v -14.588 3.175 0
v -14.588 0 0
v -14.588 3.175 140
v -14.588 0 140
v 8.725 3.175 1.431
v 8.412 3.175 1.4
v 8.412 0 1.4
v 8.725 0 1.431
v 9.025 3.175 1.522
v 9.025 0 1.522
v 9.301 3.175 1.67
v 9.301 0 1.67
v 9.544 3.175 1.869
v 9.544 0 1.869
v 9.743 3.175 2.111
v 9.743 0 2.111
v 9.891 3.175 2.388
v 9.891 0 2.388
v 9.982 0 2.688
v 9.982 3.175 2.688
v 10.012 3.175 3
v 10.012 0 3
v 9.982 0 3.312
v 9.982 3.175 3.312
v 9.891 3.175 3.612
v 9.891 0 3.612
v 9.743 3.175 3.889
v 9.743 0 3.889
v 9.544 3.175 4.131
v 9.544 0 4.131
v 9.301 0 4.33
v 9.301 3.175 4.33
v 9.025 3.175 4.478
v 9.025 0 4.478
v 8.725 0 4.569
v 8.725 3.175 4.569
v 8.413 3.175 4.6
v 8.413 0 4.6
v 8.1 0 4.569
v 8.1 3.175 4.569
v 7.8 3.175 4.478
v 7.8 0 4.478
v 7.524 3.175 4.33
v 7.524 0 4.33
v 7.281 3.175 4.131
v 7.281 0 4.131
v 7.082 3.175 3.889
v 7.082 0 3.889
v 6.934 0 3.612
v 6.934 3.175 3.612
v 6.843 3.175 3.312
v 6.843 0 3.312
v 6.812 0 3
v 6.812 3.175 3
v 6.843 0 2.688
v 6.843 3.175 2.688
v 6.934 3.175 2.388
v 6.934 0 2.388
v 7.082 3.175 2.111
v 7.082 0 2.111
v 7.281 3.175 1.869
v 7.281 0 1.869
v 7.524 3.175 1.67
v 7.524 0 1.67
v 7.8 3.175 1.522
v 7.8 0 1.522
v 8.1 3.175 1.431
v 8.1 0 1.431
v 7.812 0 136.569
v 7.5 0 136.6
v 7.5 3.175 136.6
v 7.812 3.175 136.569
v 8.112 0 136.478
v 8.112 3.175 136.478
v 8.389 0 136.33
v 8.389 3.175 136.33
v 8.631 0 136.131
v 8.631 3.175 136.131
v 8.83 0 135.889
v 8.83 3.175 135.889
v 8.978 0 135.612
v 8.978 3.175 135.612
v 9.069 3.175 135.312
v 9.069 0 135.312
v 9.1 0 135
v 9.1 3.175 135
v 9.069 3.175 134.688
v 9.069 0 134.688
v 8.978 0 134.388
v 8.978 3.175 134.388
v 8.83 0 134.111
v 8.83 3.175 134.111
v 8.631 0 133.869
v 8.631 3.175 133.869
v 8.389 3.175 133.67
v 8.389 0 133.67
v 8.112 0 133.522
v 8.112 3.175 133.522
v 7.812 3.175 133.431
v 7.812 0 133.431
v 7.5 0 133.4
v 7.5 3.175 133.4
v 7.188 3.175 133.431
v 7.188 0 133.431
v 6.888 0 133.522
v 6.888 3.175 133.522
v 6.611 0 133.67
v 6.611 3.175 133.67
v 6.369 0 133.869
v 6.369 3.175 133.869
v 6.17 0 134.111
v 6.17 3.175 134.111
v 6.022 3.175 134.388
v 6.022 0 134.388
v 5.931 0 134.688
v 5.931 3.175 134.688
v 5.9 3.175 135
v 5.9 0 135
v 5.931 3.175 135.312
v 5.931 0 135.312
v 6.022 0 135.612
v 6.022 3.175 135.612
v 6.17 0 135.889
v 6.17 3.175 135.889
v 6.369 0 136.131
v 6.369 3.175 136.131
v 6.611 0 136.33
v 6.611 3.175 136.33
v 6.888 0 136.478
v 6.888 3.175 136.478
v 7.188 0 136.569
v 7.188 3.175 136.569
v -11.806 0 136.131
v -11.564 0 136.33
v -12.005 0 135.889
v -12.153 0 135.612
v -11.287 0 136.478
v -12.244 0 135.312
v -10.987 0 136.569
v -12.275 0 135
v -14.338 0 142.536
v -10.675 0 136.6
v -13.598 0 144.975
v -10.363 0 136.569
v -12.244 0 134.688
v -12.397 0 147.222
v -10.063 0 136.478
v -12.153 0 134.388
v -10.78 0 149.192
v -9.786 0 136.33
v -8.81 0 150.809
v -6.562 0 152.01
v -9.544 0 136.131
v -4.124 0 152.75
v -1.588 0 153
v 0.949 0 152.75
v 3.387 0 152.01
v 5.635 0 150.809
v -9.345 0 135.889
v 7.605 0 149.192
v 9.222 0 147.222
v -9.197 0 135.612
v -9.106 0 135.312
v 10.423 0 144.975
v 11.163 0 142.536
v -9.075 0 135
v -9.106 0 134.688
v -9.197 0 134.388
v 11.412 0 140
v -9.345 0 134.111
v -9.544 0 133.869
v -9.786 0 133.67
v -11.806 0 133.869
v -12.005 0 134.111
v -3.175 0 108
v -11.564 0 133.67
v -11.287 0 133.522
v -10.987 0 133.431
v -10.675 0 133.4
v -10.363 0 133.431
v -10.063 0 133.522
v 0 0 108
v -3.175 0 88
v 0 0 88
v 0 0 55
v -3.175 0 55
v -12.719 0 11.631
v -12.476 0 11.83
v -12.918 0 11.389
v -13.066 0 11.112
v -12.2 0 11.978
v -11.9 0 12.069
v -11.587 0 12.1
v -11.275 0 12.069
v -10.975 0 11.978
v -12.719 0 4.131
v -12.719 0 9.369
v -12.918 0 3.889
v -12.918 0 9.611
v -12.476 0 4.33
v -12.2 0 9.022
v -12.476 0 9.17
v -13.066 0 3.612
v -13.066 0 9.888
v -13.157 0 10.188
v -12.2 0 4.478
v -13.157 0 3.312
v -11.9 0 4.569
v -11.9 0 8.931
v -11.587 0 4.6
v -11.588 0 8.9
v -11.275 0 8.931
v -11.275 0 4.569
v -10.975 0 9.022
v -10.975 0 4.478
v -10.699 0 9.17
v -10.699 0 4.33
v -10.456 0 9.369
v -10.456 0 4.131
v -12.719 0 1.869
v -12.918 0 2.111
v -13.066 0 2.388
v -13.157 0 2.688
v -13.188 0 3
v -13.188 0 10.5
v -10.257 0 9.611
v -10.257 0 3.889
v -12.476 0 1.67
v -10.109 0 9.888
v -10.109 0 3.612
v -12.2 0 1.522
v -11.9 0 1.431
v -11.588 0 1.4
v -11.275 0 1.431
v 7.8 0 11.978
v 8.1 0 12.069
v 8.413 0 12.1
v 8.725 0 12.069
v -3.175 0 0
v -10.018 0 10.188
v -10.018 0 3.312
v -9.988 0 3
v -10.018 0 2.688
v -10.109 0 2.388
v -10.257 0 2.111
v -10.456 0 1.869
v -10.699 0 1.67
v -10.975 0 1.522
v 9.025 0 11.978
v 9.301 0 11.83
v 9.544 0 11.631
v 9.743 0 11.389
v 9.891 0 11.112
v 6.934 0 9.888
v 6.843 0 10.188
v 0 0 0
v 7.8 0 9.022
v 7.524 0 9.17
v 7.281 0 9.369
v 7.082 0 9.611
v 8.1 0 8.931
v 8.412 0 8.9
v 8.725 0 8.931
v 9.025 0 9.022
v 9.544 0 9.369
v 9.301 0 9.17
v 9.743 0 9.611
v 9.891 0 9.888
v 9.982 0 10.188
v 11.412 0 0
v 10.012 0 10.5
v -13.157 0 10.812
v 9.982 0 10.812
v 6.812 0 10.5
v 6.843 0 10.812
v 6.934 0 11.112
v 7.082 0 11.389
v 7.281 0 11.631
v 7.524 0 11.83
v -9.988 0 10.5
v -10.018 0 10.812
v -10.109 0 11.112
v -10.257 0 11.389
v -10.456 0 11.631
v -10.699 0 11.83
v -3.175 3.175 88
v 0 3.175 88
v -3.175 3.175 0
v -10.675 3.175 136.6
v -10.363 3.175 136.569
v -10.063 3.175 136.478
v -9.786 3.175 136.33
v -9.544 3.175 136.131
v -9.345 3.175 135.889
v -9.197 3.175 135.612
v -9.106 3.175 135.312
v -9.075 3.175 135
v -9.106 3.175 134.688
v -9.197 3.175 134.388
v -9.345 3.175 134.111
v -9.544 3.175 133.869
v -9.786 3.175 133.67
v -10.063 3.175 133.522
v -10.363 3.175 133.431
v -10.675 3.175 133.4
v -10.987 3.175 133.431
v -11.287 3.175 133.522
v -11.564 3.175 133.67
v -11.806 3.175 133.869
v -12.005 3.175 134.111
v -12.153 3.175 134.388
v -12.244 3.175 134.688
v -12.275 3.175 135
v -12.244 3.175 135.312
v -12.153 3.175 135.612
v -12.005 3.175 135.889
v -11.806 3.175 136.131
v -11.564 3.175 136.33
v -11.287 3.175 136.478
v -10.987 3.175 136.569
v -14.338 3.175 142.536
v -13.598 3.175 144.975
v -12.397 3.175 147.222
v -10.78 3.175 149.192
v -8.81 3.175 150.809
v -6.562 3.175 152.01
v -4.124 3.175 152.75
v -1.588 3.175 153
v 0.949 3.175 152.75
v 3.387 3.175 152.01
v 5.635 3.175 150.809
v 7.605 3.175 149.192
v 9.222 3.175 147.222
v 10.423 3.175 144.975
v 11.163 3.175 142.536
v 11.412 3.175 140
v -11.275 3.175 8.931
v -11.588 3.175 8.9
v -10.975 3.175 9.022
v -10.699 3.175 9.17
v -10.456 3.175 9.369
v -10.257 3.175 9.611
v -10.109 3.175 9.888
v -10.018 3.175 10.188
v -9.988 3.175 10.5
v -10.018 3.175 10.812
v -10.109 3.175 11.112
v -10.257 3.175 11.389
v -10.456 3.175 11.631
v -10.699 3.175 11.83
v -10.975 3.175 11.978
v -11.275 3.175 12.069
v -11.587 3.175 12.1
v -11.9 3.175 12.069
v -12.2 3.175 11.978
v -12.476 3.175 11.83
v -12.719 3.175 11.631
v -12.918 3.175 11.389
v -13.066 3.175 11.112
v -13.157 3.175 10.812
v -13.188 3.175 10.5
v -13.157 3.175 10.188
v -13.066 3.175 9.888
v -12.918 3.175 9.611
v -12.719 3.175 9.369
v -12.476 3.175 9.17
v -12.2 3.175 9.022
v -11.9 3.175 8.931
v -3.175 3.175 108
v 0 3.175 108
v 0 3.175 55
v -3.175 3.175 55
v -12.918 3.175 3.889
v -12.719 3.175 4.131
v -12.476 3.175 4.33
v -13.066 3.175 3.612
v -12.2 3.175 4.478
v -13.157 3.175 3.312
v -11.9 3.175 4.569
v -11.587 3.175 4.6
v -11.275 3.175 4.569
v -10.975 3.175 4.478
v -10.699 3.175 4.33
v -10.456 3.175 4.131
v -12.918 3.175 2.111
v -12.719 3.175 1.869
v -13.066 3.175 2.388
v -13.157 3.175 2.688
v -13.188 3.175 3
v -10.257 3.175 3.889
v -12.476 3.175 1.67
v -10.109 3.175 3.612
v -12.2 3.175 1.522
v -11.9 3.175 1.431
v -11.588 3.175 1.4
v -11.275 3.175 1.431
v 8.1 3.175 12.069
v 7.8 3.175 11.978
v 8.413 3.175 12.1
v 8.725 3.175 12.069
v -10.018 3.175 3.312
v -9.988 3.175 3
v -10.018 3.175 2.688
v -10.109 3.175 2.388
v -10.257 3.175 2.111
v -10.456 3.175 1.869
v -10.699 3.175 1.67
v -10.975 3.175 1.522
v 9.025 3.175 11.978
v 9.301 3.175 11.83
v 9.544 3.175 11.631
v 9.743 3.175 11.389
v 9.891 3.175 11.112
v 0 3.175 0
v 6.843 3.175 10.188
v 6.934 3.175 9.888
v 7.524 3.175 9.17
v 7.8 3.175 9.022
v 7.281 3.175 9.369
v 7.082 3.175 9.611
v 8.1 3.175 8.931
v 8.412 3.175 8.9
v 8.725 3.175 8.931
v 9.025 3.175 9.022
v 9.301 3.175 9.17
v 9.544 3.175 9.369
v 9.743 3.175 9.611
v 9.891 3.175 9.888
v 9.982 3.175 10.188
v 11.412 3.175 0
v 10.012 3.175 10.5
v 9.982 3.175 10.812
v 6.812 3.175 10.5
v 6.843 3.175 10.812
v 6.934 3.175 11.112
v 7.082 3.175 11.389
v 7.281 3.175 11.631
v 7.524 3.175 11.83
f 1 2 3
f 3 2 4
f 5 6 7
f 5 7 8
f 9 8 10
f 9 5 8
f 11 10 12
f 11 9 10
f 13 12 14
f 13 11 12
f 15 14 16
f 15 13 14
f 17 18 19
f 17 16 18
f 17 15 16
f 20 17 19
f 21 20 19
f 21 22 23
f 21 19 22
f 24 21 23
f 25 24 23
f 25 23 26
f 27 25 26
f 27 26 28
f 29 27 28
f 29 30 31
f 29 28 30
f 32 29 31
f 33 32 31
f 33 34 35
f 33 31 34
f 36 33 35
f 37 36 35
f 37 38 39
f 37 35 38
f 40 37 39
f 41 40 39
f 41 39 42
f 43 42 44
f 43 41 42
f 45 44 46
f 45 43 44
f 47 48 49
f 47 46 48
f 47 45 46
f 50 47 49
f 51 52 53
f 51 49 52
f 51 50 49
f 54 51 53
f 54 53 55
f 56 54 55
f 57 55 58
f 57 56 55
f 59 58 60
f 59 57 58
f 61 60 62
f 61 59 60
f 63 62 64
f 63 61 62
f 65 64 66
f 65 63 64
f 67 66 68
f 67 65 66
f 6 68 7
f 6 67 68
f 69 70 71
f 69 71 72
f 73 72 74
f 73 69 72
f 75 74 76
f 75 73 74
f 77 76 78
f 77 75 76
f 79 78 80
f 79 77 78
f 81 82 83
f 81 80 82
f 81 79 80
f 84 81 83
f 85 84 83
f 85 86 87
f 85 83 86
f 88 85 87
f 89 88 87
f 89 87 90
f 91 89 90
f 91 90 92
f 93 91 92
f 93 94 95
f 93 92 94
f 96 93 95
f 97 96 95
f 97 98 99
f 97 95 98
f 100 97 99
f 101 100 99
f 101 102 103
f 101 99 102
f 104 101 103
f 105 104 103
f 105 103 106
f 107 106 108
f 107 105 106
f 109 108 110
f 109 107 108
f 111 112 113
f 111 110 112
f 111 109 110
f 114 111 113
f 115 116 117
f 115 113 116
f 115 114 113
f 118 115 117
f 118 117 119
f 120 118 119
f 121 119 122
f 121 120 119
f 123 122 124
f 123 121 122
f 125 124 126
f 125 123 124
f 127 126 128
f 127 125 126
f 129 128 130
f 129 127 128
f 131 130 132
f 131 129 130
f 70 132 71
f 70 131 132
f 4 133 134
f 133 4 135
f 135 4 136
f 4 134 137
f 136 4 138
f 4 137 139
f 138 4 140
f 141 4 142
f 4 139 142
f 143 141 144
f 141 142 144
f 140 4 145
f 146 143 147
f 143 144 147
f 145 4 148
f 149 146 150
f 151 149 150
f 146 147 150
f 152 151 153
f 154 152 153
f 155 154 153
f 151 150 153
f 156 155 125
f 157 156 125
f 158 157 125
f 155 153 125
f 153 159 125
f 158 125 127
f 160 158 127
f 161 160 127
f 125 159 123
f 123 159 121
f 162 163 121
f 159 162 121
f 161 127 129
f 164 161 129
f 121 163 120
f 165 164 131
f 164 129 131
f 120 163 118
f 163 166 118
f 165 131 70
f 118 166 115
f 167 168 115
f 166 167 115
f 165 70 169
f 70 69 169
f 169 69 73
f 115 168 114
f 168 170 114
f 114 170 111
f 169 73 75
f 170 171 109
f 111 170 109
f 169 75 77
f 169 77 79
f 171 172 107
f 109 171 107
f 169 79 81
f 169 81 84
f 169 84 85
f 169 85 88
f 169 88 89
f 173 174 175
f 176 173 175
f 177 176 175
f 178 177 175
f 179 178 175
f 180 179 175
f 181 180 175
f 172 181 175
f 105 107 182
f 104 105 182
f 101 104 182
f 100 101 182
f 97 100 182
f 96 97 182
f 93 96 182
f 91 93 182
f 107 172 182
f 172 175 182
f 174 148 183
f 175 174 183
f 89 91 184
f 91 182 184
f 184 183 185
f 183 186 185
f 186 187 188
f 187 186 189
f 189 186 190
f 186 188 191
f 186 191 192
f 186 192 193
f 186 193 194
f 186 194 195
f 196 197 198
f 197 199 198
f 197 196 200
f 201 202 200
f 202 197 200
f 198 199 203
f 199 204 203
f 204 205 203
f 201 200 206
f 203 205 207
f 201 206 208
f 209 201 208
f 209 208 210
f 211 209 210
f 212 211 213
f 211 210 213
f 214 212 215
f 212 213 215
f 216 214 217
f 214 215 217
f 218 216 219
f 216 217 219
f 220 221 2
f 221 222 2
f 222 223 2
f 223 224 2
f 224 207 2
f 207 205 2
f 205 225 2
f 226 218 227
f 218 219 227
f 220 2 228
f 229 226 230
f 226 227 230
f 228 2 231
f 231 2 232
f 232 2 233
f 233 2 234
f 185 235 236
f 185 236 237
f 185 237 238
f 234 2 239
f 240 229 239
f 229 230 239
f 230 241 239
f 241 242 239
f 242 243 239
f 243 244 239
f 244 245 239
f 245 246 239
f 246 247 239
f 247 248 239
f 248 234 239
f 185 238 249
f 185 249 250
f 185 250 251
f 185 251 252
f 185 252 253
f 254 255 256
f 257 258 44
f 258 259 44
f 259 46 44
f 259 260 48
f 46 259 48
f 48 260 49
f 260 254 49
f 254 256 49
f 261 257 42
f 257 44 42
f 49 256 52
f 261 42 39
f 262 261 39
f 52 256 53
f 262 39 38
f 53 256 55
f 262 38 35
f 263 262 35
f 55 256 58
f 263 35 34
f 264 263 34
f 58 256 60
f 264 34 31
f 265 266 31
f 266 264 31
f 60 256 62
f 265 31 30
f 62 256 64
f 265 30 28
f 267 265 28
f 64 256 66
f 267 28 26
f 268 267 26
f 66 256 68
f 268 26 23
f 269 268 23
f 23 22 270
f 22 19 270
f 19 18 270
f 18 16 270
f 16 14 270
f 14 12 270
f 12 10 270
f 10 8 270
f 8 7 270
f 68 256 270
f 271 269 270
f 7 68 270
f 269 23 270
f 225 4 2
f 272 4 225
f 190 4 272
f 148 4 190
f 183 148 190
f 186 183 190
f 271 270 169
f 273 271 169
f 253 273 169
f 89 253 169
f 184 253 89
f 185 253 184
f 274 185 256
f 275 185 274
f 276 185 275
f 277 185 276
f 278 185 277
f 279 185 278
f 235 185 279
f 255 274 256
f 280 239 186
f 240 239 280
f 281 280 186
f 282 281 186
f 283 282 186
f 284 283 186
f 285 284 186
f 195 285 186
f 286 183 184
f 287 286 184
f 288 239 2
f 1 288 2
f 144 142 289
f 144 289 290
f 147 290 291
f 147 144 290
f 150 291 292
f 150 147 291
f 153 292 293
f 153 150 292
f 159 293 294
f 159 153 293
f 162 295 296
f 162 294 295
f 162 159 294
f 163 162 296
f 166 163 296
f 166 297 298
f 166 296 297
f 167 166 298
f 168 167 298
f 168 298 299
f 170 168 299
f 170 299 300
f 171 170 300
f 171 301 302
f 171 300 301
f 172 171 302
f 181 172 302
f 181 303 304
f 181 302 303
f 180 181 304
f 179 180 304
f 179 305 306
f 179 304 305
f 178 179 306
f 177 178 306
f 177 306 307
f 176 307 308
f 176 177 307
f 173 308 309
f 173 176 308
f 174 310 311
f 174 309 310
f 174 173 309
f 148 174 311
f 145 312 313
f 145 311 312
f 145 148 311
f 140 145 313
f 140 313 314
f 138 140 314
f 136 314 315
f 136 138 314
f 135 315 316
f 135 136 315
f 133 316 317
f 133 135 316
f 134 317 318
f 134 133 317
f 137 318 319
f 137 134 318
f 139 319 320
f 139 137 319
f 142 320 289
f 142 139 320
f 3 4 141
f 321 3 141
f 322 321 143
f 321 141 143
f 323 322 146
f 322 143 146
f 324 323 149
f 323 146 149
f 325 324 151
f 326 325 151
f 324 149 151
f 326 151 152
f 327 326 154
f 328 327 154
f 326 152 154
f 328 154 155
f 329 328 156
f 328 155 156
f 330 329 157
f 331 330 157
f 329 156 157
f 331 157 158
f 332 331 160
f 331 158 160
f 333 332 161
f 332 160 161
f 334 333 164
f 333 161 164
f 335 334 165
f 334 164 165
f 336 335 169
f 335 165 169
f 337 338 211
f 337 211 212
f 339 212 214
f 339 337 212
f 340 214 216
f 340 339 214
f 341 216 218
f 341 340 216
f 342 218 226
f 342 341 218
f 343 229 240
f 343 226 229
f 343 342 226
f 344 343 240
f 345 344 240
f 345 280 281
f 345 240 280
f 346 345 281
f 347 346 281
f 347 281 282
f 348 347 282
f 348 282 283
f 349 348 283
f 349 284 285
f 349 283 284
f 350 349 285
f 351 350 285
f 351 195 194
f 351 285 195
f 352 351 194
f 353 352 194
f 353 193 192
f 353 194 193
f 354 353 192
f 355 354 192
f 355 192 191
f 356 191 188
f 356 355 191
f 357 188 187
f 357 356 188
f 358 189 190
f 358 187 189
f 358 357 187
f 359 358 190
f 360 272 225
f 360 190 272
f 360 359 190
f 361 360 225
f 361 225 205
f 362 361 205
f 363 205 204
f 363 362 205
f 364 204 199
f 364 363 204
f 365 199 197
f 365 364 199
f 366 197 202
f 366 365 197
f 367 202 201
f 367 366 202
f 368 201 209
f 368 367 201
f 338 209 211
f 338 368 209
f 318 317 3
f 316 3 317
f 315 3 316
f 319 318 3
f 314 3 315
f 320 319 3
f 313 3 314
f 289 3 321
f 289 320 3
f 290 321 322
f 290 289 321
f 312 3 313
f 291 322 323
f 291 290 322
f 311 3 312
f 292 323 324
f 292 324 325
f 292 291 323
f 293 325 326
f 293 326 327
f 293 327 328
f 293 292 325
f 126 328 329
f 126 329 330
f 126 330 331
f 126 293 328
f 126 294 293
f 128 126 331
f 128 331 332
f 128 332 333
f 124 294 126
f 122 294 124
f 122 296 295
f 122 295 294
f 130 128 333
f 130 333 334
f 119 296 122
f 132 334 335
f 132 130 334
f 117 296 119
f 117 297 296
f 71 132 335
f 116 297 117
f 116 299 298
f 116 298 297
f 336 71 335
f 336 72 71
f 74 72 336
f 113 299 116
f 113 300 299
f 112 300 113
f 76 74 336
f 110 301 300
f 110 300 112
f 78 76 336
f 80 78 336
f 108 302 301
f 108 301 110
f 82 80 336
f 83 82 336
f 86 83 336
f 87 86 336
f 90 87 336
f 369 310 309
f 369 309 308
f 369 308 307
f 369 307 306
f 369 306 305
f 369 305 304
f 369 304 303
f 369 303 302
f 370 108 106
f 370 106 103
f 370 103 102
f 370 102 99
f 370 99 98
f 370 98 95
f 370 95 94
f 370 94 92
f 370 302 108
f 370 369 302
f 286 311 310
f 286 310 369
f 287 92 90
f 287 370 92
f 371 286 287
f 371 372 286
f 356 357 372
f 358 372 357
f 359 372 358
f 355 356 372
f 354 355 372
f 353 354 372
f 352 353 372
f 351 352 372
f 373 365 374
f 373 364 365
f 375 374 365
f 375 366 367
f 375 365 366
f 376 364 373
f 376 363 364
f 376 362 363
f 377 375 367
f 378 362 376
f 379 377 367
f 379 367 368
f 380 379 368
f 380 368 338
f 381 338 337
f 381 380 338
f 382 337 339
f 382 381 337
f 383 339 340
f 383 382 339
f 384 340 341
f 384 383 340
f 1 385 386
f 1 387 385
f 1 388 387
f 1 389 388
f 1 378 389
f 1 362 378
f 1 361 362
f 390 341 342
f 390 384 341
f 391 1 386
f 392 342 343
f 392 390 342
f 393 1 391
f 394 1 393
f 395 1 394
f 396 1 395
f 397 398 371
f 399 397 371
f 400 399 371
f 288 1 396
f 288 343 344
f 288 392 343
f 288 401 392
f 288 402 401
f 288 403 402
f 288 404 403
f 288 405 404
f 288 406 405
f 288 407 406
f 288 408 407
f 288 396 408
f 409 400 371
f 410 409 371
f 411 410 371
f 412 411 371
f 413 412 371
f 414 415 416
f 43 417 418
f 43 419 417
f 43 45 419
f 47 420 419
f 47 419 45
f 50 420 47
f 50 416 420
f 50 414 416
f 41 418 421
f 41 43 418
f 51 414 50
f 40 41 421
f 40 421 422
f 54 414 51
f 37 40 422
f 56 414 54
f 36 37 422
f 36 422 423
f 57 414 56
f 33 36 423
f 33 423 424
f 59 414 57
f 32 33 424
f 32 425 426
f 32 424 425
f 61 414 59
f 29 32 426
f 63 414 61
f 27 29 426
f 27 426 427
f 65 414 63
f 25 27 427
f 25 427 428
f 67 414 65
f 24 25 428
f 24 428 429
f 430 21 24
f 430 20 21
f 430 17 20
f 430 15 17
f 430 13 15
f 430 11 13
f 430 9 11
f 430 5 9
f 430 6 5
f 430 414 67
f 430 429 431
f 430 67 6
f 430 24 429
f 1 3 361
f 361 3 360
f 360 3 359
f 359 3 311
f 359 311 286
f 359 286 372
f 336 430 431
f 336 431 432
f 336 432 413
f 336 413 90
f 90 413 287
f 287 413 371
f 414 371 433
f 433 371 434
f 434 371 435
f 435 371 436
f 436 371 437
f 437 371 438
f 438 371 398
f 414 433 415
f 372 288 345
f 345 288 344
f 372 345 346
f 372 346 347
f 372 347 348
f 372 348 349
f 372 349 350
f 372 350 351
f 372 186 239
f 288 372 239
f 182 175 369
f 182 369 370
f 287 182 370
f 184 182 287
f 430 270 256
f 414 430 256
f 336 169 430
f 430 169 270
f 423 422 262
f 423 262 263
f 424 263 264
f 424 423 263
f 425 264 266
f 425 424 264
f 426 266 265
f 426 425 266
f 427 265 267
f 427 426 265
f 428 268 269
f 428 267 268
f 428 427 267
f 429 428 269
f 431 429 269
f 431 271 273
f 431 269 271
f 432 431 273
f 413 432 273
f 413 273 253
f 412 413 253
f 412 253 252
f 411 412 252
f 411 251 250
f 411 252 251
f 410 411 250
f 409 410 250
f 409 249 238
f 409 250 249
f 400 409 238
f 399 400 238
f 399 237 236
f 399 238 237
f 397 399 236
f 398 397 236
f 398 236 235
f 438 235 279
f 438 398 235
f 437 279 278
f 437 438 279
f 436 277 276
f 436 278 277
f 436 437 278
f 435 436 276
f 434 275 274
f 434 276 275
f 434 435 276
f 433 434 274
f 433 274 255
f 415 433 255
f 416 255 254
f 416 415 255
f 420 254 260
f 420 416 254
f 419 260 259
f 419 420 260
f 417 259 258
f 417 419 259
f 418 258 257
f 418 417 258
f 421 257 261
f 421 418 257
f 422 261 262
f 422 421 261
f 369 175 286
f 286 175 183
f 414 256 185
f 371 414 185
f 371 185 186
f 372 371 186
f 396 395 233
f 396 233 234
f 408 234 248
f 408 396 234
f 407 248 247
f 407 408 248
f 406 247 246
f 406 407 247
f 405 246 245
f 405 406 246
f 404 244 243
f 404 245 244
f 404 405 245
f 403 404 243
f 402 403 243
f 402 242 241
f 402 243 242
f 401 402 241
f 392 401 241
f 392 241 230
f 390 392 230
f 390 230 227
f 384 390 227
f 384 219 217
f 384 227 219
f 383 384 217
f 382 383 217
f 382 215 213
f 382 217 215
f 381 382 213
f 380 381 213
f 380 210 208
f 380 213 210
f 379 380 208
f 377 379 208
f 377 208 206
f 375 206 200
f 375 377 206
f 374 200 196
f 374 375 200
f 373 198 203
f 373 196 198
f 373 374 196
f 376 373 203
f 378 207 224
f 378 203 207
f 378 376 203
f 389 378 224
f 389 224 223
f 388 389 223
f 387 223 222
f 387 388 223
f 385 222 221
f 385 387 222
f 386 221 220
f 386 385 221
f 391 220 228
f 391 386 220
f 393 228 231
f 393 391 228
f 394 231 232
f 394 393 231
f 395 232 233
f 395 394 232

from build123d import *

# Parameters (mm, degrees)
SKETCH1_W               = 3.175
SKETCH1_H               = 20
BOSS_EXTRUDE1_DEPTH     = 3.175
CUT_EXTRUDE2_DEPTH      = 154.72662678
CUT_EXTRUDE2_DEPTH_BACK = 154.72662678
SKETCH4_R               = 1.6
CUT_EXTRUDE3_DEPTH      = 154.72662678
CUT_EXTRUDE3_DEPTH_BACK = 154.72662678
SKETCH5_R               = 1.6


with BuildPart() as part:
    # Sketch1 → Boss-Extrude1 (new body)
    with BuildSketch(Plane(origin=(0, 0, 0), x_dir=(1, 0, 0), z_dir=(0, 1, 0))):
        with BuildLine():
            Line((-14.5875, 0), (-14.5875, -140))
            ThreePointArc((-14.5875, -140), (-1.5875, -153), (11.4125, -140))
            Line((11.4125, -140), (11.4125, 0))
            Line((11.4125, 0), (0, 0))
            Line((0, 0), (0, -55))
            Line((0, -55), (-3.175, -55))
            Line((-3.175, -55), (-3.175, 0))
            Line((-3.175, 0), (-14.5875, 0))
        make_face()
        with Locations((-1.5875, -98)):
            Rectangle(SKETCH1_W, SKETCH1_H, mode=Mode.SUBTRACT)
    extrude(amount=BOSS_EXTRUDE1_DEPTH)

    # Sketch4 → Cut-Extrude2 (cut, two sides: drawn at the far end of the back side and taken through both)
    with BuildSketch(Plane.XZ.offset(-CUT_EXTRUDE2_DEPTH_BACK)):
        with Locations(Location((8.4125, 3, 0), (0, 0, 270))):
            Circle(SKETCH4_R)
        with Locations(Location((8.4125, 10.5, 0), (0, 0, 270))):
            Circle(SKETCH4_R)
        with Locations(Location((-11.5875, 10.5, 0), (0, 0, 270))):
            Circle(SKETCH4_R)
        with Locations(Location((-11.5875, 3, 0), (0, 0, 270))):
            Circle(SKETCH4_R)
    extrude(amount=CUT_EXTRUDE2_DEPTH + CUT_EXTRUDE2_DEPTH_BACK, mode=Mode.SUBTRACT)

    # Sketch5 → Cut-Extrude3 (cut, two sides: drawn at the far end of the back side and taken through both)
    with BuildSketch(Plane(origin=(0, 3.175, 0), x_dir=(1, 0, 0), z_dir=(0, 1, 0)).offset(-CUT_EXTRUDE3_DEPTH_BACK)):
        with Locations(Location((-10.675, -135, 0), (0, 0, 270))):
            Circle(SKETCH5_R)
        with Locations(Location((7.5, -135, 0), (0, 0, 270))):
            Circle(SKETCH5_R)
    extrude(amount=CUT_EXTRUDE3_DEPTH + CUT_EXTRUDE3_DEPTH_BACK, mode=Mode.SUBTRACT)


solid = part.part
